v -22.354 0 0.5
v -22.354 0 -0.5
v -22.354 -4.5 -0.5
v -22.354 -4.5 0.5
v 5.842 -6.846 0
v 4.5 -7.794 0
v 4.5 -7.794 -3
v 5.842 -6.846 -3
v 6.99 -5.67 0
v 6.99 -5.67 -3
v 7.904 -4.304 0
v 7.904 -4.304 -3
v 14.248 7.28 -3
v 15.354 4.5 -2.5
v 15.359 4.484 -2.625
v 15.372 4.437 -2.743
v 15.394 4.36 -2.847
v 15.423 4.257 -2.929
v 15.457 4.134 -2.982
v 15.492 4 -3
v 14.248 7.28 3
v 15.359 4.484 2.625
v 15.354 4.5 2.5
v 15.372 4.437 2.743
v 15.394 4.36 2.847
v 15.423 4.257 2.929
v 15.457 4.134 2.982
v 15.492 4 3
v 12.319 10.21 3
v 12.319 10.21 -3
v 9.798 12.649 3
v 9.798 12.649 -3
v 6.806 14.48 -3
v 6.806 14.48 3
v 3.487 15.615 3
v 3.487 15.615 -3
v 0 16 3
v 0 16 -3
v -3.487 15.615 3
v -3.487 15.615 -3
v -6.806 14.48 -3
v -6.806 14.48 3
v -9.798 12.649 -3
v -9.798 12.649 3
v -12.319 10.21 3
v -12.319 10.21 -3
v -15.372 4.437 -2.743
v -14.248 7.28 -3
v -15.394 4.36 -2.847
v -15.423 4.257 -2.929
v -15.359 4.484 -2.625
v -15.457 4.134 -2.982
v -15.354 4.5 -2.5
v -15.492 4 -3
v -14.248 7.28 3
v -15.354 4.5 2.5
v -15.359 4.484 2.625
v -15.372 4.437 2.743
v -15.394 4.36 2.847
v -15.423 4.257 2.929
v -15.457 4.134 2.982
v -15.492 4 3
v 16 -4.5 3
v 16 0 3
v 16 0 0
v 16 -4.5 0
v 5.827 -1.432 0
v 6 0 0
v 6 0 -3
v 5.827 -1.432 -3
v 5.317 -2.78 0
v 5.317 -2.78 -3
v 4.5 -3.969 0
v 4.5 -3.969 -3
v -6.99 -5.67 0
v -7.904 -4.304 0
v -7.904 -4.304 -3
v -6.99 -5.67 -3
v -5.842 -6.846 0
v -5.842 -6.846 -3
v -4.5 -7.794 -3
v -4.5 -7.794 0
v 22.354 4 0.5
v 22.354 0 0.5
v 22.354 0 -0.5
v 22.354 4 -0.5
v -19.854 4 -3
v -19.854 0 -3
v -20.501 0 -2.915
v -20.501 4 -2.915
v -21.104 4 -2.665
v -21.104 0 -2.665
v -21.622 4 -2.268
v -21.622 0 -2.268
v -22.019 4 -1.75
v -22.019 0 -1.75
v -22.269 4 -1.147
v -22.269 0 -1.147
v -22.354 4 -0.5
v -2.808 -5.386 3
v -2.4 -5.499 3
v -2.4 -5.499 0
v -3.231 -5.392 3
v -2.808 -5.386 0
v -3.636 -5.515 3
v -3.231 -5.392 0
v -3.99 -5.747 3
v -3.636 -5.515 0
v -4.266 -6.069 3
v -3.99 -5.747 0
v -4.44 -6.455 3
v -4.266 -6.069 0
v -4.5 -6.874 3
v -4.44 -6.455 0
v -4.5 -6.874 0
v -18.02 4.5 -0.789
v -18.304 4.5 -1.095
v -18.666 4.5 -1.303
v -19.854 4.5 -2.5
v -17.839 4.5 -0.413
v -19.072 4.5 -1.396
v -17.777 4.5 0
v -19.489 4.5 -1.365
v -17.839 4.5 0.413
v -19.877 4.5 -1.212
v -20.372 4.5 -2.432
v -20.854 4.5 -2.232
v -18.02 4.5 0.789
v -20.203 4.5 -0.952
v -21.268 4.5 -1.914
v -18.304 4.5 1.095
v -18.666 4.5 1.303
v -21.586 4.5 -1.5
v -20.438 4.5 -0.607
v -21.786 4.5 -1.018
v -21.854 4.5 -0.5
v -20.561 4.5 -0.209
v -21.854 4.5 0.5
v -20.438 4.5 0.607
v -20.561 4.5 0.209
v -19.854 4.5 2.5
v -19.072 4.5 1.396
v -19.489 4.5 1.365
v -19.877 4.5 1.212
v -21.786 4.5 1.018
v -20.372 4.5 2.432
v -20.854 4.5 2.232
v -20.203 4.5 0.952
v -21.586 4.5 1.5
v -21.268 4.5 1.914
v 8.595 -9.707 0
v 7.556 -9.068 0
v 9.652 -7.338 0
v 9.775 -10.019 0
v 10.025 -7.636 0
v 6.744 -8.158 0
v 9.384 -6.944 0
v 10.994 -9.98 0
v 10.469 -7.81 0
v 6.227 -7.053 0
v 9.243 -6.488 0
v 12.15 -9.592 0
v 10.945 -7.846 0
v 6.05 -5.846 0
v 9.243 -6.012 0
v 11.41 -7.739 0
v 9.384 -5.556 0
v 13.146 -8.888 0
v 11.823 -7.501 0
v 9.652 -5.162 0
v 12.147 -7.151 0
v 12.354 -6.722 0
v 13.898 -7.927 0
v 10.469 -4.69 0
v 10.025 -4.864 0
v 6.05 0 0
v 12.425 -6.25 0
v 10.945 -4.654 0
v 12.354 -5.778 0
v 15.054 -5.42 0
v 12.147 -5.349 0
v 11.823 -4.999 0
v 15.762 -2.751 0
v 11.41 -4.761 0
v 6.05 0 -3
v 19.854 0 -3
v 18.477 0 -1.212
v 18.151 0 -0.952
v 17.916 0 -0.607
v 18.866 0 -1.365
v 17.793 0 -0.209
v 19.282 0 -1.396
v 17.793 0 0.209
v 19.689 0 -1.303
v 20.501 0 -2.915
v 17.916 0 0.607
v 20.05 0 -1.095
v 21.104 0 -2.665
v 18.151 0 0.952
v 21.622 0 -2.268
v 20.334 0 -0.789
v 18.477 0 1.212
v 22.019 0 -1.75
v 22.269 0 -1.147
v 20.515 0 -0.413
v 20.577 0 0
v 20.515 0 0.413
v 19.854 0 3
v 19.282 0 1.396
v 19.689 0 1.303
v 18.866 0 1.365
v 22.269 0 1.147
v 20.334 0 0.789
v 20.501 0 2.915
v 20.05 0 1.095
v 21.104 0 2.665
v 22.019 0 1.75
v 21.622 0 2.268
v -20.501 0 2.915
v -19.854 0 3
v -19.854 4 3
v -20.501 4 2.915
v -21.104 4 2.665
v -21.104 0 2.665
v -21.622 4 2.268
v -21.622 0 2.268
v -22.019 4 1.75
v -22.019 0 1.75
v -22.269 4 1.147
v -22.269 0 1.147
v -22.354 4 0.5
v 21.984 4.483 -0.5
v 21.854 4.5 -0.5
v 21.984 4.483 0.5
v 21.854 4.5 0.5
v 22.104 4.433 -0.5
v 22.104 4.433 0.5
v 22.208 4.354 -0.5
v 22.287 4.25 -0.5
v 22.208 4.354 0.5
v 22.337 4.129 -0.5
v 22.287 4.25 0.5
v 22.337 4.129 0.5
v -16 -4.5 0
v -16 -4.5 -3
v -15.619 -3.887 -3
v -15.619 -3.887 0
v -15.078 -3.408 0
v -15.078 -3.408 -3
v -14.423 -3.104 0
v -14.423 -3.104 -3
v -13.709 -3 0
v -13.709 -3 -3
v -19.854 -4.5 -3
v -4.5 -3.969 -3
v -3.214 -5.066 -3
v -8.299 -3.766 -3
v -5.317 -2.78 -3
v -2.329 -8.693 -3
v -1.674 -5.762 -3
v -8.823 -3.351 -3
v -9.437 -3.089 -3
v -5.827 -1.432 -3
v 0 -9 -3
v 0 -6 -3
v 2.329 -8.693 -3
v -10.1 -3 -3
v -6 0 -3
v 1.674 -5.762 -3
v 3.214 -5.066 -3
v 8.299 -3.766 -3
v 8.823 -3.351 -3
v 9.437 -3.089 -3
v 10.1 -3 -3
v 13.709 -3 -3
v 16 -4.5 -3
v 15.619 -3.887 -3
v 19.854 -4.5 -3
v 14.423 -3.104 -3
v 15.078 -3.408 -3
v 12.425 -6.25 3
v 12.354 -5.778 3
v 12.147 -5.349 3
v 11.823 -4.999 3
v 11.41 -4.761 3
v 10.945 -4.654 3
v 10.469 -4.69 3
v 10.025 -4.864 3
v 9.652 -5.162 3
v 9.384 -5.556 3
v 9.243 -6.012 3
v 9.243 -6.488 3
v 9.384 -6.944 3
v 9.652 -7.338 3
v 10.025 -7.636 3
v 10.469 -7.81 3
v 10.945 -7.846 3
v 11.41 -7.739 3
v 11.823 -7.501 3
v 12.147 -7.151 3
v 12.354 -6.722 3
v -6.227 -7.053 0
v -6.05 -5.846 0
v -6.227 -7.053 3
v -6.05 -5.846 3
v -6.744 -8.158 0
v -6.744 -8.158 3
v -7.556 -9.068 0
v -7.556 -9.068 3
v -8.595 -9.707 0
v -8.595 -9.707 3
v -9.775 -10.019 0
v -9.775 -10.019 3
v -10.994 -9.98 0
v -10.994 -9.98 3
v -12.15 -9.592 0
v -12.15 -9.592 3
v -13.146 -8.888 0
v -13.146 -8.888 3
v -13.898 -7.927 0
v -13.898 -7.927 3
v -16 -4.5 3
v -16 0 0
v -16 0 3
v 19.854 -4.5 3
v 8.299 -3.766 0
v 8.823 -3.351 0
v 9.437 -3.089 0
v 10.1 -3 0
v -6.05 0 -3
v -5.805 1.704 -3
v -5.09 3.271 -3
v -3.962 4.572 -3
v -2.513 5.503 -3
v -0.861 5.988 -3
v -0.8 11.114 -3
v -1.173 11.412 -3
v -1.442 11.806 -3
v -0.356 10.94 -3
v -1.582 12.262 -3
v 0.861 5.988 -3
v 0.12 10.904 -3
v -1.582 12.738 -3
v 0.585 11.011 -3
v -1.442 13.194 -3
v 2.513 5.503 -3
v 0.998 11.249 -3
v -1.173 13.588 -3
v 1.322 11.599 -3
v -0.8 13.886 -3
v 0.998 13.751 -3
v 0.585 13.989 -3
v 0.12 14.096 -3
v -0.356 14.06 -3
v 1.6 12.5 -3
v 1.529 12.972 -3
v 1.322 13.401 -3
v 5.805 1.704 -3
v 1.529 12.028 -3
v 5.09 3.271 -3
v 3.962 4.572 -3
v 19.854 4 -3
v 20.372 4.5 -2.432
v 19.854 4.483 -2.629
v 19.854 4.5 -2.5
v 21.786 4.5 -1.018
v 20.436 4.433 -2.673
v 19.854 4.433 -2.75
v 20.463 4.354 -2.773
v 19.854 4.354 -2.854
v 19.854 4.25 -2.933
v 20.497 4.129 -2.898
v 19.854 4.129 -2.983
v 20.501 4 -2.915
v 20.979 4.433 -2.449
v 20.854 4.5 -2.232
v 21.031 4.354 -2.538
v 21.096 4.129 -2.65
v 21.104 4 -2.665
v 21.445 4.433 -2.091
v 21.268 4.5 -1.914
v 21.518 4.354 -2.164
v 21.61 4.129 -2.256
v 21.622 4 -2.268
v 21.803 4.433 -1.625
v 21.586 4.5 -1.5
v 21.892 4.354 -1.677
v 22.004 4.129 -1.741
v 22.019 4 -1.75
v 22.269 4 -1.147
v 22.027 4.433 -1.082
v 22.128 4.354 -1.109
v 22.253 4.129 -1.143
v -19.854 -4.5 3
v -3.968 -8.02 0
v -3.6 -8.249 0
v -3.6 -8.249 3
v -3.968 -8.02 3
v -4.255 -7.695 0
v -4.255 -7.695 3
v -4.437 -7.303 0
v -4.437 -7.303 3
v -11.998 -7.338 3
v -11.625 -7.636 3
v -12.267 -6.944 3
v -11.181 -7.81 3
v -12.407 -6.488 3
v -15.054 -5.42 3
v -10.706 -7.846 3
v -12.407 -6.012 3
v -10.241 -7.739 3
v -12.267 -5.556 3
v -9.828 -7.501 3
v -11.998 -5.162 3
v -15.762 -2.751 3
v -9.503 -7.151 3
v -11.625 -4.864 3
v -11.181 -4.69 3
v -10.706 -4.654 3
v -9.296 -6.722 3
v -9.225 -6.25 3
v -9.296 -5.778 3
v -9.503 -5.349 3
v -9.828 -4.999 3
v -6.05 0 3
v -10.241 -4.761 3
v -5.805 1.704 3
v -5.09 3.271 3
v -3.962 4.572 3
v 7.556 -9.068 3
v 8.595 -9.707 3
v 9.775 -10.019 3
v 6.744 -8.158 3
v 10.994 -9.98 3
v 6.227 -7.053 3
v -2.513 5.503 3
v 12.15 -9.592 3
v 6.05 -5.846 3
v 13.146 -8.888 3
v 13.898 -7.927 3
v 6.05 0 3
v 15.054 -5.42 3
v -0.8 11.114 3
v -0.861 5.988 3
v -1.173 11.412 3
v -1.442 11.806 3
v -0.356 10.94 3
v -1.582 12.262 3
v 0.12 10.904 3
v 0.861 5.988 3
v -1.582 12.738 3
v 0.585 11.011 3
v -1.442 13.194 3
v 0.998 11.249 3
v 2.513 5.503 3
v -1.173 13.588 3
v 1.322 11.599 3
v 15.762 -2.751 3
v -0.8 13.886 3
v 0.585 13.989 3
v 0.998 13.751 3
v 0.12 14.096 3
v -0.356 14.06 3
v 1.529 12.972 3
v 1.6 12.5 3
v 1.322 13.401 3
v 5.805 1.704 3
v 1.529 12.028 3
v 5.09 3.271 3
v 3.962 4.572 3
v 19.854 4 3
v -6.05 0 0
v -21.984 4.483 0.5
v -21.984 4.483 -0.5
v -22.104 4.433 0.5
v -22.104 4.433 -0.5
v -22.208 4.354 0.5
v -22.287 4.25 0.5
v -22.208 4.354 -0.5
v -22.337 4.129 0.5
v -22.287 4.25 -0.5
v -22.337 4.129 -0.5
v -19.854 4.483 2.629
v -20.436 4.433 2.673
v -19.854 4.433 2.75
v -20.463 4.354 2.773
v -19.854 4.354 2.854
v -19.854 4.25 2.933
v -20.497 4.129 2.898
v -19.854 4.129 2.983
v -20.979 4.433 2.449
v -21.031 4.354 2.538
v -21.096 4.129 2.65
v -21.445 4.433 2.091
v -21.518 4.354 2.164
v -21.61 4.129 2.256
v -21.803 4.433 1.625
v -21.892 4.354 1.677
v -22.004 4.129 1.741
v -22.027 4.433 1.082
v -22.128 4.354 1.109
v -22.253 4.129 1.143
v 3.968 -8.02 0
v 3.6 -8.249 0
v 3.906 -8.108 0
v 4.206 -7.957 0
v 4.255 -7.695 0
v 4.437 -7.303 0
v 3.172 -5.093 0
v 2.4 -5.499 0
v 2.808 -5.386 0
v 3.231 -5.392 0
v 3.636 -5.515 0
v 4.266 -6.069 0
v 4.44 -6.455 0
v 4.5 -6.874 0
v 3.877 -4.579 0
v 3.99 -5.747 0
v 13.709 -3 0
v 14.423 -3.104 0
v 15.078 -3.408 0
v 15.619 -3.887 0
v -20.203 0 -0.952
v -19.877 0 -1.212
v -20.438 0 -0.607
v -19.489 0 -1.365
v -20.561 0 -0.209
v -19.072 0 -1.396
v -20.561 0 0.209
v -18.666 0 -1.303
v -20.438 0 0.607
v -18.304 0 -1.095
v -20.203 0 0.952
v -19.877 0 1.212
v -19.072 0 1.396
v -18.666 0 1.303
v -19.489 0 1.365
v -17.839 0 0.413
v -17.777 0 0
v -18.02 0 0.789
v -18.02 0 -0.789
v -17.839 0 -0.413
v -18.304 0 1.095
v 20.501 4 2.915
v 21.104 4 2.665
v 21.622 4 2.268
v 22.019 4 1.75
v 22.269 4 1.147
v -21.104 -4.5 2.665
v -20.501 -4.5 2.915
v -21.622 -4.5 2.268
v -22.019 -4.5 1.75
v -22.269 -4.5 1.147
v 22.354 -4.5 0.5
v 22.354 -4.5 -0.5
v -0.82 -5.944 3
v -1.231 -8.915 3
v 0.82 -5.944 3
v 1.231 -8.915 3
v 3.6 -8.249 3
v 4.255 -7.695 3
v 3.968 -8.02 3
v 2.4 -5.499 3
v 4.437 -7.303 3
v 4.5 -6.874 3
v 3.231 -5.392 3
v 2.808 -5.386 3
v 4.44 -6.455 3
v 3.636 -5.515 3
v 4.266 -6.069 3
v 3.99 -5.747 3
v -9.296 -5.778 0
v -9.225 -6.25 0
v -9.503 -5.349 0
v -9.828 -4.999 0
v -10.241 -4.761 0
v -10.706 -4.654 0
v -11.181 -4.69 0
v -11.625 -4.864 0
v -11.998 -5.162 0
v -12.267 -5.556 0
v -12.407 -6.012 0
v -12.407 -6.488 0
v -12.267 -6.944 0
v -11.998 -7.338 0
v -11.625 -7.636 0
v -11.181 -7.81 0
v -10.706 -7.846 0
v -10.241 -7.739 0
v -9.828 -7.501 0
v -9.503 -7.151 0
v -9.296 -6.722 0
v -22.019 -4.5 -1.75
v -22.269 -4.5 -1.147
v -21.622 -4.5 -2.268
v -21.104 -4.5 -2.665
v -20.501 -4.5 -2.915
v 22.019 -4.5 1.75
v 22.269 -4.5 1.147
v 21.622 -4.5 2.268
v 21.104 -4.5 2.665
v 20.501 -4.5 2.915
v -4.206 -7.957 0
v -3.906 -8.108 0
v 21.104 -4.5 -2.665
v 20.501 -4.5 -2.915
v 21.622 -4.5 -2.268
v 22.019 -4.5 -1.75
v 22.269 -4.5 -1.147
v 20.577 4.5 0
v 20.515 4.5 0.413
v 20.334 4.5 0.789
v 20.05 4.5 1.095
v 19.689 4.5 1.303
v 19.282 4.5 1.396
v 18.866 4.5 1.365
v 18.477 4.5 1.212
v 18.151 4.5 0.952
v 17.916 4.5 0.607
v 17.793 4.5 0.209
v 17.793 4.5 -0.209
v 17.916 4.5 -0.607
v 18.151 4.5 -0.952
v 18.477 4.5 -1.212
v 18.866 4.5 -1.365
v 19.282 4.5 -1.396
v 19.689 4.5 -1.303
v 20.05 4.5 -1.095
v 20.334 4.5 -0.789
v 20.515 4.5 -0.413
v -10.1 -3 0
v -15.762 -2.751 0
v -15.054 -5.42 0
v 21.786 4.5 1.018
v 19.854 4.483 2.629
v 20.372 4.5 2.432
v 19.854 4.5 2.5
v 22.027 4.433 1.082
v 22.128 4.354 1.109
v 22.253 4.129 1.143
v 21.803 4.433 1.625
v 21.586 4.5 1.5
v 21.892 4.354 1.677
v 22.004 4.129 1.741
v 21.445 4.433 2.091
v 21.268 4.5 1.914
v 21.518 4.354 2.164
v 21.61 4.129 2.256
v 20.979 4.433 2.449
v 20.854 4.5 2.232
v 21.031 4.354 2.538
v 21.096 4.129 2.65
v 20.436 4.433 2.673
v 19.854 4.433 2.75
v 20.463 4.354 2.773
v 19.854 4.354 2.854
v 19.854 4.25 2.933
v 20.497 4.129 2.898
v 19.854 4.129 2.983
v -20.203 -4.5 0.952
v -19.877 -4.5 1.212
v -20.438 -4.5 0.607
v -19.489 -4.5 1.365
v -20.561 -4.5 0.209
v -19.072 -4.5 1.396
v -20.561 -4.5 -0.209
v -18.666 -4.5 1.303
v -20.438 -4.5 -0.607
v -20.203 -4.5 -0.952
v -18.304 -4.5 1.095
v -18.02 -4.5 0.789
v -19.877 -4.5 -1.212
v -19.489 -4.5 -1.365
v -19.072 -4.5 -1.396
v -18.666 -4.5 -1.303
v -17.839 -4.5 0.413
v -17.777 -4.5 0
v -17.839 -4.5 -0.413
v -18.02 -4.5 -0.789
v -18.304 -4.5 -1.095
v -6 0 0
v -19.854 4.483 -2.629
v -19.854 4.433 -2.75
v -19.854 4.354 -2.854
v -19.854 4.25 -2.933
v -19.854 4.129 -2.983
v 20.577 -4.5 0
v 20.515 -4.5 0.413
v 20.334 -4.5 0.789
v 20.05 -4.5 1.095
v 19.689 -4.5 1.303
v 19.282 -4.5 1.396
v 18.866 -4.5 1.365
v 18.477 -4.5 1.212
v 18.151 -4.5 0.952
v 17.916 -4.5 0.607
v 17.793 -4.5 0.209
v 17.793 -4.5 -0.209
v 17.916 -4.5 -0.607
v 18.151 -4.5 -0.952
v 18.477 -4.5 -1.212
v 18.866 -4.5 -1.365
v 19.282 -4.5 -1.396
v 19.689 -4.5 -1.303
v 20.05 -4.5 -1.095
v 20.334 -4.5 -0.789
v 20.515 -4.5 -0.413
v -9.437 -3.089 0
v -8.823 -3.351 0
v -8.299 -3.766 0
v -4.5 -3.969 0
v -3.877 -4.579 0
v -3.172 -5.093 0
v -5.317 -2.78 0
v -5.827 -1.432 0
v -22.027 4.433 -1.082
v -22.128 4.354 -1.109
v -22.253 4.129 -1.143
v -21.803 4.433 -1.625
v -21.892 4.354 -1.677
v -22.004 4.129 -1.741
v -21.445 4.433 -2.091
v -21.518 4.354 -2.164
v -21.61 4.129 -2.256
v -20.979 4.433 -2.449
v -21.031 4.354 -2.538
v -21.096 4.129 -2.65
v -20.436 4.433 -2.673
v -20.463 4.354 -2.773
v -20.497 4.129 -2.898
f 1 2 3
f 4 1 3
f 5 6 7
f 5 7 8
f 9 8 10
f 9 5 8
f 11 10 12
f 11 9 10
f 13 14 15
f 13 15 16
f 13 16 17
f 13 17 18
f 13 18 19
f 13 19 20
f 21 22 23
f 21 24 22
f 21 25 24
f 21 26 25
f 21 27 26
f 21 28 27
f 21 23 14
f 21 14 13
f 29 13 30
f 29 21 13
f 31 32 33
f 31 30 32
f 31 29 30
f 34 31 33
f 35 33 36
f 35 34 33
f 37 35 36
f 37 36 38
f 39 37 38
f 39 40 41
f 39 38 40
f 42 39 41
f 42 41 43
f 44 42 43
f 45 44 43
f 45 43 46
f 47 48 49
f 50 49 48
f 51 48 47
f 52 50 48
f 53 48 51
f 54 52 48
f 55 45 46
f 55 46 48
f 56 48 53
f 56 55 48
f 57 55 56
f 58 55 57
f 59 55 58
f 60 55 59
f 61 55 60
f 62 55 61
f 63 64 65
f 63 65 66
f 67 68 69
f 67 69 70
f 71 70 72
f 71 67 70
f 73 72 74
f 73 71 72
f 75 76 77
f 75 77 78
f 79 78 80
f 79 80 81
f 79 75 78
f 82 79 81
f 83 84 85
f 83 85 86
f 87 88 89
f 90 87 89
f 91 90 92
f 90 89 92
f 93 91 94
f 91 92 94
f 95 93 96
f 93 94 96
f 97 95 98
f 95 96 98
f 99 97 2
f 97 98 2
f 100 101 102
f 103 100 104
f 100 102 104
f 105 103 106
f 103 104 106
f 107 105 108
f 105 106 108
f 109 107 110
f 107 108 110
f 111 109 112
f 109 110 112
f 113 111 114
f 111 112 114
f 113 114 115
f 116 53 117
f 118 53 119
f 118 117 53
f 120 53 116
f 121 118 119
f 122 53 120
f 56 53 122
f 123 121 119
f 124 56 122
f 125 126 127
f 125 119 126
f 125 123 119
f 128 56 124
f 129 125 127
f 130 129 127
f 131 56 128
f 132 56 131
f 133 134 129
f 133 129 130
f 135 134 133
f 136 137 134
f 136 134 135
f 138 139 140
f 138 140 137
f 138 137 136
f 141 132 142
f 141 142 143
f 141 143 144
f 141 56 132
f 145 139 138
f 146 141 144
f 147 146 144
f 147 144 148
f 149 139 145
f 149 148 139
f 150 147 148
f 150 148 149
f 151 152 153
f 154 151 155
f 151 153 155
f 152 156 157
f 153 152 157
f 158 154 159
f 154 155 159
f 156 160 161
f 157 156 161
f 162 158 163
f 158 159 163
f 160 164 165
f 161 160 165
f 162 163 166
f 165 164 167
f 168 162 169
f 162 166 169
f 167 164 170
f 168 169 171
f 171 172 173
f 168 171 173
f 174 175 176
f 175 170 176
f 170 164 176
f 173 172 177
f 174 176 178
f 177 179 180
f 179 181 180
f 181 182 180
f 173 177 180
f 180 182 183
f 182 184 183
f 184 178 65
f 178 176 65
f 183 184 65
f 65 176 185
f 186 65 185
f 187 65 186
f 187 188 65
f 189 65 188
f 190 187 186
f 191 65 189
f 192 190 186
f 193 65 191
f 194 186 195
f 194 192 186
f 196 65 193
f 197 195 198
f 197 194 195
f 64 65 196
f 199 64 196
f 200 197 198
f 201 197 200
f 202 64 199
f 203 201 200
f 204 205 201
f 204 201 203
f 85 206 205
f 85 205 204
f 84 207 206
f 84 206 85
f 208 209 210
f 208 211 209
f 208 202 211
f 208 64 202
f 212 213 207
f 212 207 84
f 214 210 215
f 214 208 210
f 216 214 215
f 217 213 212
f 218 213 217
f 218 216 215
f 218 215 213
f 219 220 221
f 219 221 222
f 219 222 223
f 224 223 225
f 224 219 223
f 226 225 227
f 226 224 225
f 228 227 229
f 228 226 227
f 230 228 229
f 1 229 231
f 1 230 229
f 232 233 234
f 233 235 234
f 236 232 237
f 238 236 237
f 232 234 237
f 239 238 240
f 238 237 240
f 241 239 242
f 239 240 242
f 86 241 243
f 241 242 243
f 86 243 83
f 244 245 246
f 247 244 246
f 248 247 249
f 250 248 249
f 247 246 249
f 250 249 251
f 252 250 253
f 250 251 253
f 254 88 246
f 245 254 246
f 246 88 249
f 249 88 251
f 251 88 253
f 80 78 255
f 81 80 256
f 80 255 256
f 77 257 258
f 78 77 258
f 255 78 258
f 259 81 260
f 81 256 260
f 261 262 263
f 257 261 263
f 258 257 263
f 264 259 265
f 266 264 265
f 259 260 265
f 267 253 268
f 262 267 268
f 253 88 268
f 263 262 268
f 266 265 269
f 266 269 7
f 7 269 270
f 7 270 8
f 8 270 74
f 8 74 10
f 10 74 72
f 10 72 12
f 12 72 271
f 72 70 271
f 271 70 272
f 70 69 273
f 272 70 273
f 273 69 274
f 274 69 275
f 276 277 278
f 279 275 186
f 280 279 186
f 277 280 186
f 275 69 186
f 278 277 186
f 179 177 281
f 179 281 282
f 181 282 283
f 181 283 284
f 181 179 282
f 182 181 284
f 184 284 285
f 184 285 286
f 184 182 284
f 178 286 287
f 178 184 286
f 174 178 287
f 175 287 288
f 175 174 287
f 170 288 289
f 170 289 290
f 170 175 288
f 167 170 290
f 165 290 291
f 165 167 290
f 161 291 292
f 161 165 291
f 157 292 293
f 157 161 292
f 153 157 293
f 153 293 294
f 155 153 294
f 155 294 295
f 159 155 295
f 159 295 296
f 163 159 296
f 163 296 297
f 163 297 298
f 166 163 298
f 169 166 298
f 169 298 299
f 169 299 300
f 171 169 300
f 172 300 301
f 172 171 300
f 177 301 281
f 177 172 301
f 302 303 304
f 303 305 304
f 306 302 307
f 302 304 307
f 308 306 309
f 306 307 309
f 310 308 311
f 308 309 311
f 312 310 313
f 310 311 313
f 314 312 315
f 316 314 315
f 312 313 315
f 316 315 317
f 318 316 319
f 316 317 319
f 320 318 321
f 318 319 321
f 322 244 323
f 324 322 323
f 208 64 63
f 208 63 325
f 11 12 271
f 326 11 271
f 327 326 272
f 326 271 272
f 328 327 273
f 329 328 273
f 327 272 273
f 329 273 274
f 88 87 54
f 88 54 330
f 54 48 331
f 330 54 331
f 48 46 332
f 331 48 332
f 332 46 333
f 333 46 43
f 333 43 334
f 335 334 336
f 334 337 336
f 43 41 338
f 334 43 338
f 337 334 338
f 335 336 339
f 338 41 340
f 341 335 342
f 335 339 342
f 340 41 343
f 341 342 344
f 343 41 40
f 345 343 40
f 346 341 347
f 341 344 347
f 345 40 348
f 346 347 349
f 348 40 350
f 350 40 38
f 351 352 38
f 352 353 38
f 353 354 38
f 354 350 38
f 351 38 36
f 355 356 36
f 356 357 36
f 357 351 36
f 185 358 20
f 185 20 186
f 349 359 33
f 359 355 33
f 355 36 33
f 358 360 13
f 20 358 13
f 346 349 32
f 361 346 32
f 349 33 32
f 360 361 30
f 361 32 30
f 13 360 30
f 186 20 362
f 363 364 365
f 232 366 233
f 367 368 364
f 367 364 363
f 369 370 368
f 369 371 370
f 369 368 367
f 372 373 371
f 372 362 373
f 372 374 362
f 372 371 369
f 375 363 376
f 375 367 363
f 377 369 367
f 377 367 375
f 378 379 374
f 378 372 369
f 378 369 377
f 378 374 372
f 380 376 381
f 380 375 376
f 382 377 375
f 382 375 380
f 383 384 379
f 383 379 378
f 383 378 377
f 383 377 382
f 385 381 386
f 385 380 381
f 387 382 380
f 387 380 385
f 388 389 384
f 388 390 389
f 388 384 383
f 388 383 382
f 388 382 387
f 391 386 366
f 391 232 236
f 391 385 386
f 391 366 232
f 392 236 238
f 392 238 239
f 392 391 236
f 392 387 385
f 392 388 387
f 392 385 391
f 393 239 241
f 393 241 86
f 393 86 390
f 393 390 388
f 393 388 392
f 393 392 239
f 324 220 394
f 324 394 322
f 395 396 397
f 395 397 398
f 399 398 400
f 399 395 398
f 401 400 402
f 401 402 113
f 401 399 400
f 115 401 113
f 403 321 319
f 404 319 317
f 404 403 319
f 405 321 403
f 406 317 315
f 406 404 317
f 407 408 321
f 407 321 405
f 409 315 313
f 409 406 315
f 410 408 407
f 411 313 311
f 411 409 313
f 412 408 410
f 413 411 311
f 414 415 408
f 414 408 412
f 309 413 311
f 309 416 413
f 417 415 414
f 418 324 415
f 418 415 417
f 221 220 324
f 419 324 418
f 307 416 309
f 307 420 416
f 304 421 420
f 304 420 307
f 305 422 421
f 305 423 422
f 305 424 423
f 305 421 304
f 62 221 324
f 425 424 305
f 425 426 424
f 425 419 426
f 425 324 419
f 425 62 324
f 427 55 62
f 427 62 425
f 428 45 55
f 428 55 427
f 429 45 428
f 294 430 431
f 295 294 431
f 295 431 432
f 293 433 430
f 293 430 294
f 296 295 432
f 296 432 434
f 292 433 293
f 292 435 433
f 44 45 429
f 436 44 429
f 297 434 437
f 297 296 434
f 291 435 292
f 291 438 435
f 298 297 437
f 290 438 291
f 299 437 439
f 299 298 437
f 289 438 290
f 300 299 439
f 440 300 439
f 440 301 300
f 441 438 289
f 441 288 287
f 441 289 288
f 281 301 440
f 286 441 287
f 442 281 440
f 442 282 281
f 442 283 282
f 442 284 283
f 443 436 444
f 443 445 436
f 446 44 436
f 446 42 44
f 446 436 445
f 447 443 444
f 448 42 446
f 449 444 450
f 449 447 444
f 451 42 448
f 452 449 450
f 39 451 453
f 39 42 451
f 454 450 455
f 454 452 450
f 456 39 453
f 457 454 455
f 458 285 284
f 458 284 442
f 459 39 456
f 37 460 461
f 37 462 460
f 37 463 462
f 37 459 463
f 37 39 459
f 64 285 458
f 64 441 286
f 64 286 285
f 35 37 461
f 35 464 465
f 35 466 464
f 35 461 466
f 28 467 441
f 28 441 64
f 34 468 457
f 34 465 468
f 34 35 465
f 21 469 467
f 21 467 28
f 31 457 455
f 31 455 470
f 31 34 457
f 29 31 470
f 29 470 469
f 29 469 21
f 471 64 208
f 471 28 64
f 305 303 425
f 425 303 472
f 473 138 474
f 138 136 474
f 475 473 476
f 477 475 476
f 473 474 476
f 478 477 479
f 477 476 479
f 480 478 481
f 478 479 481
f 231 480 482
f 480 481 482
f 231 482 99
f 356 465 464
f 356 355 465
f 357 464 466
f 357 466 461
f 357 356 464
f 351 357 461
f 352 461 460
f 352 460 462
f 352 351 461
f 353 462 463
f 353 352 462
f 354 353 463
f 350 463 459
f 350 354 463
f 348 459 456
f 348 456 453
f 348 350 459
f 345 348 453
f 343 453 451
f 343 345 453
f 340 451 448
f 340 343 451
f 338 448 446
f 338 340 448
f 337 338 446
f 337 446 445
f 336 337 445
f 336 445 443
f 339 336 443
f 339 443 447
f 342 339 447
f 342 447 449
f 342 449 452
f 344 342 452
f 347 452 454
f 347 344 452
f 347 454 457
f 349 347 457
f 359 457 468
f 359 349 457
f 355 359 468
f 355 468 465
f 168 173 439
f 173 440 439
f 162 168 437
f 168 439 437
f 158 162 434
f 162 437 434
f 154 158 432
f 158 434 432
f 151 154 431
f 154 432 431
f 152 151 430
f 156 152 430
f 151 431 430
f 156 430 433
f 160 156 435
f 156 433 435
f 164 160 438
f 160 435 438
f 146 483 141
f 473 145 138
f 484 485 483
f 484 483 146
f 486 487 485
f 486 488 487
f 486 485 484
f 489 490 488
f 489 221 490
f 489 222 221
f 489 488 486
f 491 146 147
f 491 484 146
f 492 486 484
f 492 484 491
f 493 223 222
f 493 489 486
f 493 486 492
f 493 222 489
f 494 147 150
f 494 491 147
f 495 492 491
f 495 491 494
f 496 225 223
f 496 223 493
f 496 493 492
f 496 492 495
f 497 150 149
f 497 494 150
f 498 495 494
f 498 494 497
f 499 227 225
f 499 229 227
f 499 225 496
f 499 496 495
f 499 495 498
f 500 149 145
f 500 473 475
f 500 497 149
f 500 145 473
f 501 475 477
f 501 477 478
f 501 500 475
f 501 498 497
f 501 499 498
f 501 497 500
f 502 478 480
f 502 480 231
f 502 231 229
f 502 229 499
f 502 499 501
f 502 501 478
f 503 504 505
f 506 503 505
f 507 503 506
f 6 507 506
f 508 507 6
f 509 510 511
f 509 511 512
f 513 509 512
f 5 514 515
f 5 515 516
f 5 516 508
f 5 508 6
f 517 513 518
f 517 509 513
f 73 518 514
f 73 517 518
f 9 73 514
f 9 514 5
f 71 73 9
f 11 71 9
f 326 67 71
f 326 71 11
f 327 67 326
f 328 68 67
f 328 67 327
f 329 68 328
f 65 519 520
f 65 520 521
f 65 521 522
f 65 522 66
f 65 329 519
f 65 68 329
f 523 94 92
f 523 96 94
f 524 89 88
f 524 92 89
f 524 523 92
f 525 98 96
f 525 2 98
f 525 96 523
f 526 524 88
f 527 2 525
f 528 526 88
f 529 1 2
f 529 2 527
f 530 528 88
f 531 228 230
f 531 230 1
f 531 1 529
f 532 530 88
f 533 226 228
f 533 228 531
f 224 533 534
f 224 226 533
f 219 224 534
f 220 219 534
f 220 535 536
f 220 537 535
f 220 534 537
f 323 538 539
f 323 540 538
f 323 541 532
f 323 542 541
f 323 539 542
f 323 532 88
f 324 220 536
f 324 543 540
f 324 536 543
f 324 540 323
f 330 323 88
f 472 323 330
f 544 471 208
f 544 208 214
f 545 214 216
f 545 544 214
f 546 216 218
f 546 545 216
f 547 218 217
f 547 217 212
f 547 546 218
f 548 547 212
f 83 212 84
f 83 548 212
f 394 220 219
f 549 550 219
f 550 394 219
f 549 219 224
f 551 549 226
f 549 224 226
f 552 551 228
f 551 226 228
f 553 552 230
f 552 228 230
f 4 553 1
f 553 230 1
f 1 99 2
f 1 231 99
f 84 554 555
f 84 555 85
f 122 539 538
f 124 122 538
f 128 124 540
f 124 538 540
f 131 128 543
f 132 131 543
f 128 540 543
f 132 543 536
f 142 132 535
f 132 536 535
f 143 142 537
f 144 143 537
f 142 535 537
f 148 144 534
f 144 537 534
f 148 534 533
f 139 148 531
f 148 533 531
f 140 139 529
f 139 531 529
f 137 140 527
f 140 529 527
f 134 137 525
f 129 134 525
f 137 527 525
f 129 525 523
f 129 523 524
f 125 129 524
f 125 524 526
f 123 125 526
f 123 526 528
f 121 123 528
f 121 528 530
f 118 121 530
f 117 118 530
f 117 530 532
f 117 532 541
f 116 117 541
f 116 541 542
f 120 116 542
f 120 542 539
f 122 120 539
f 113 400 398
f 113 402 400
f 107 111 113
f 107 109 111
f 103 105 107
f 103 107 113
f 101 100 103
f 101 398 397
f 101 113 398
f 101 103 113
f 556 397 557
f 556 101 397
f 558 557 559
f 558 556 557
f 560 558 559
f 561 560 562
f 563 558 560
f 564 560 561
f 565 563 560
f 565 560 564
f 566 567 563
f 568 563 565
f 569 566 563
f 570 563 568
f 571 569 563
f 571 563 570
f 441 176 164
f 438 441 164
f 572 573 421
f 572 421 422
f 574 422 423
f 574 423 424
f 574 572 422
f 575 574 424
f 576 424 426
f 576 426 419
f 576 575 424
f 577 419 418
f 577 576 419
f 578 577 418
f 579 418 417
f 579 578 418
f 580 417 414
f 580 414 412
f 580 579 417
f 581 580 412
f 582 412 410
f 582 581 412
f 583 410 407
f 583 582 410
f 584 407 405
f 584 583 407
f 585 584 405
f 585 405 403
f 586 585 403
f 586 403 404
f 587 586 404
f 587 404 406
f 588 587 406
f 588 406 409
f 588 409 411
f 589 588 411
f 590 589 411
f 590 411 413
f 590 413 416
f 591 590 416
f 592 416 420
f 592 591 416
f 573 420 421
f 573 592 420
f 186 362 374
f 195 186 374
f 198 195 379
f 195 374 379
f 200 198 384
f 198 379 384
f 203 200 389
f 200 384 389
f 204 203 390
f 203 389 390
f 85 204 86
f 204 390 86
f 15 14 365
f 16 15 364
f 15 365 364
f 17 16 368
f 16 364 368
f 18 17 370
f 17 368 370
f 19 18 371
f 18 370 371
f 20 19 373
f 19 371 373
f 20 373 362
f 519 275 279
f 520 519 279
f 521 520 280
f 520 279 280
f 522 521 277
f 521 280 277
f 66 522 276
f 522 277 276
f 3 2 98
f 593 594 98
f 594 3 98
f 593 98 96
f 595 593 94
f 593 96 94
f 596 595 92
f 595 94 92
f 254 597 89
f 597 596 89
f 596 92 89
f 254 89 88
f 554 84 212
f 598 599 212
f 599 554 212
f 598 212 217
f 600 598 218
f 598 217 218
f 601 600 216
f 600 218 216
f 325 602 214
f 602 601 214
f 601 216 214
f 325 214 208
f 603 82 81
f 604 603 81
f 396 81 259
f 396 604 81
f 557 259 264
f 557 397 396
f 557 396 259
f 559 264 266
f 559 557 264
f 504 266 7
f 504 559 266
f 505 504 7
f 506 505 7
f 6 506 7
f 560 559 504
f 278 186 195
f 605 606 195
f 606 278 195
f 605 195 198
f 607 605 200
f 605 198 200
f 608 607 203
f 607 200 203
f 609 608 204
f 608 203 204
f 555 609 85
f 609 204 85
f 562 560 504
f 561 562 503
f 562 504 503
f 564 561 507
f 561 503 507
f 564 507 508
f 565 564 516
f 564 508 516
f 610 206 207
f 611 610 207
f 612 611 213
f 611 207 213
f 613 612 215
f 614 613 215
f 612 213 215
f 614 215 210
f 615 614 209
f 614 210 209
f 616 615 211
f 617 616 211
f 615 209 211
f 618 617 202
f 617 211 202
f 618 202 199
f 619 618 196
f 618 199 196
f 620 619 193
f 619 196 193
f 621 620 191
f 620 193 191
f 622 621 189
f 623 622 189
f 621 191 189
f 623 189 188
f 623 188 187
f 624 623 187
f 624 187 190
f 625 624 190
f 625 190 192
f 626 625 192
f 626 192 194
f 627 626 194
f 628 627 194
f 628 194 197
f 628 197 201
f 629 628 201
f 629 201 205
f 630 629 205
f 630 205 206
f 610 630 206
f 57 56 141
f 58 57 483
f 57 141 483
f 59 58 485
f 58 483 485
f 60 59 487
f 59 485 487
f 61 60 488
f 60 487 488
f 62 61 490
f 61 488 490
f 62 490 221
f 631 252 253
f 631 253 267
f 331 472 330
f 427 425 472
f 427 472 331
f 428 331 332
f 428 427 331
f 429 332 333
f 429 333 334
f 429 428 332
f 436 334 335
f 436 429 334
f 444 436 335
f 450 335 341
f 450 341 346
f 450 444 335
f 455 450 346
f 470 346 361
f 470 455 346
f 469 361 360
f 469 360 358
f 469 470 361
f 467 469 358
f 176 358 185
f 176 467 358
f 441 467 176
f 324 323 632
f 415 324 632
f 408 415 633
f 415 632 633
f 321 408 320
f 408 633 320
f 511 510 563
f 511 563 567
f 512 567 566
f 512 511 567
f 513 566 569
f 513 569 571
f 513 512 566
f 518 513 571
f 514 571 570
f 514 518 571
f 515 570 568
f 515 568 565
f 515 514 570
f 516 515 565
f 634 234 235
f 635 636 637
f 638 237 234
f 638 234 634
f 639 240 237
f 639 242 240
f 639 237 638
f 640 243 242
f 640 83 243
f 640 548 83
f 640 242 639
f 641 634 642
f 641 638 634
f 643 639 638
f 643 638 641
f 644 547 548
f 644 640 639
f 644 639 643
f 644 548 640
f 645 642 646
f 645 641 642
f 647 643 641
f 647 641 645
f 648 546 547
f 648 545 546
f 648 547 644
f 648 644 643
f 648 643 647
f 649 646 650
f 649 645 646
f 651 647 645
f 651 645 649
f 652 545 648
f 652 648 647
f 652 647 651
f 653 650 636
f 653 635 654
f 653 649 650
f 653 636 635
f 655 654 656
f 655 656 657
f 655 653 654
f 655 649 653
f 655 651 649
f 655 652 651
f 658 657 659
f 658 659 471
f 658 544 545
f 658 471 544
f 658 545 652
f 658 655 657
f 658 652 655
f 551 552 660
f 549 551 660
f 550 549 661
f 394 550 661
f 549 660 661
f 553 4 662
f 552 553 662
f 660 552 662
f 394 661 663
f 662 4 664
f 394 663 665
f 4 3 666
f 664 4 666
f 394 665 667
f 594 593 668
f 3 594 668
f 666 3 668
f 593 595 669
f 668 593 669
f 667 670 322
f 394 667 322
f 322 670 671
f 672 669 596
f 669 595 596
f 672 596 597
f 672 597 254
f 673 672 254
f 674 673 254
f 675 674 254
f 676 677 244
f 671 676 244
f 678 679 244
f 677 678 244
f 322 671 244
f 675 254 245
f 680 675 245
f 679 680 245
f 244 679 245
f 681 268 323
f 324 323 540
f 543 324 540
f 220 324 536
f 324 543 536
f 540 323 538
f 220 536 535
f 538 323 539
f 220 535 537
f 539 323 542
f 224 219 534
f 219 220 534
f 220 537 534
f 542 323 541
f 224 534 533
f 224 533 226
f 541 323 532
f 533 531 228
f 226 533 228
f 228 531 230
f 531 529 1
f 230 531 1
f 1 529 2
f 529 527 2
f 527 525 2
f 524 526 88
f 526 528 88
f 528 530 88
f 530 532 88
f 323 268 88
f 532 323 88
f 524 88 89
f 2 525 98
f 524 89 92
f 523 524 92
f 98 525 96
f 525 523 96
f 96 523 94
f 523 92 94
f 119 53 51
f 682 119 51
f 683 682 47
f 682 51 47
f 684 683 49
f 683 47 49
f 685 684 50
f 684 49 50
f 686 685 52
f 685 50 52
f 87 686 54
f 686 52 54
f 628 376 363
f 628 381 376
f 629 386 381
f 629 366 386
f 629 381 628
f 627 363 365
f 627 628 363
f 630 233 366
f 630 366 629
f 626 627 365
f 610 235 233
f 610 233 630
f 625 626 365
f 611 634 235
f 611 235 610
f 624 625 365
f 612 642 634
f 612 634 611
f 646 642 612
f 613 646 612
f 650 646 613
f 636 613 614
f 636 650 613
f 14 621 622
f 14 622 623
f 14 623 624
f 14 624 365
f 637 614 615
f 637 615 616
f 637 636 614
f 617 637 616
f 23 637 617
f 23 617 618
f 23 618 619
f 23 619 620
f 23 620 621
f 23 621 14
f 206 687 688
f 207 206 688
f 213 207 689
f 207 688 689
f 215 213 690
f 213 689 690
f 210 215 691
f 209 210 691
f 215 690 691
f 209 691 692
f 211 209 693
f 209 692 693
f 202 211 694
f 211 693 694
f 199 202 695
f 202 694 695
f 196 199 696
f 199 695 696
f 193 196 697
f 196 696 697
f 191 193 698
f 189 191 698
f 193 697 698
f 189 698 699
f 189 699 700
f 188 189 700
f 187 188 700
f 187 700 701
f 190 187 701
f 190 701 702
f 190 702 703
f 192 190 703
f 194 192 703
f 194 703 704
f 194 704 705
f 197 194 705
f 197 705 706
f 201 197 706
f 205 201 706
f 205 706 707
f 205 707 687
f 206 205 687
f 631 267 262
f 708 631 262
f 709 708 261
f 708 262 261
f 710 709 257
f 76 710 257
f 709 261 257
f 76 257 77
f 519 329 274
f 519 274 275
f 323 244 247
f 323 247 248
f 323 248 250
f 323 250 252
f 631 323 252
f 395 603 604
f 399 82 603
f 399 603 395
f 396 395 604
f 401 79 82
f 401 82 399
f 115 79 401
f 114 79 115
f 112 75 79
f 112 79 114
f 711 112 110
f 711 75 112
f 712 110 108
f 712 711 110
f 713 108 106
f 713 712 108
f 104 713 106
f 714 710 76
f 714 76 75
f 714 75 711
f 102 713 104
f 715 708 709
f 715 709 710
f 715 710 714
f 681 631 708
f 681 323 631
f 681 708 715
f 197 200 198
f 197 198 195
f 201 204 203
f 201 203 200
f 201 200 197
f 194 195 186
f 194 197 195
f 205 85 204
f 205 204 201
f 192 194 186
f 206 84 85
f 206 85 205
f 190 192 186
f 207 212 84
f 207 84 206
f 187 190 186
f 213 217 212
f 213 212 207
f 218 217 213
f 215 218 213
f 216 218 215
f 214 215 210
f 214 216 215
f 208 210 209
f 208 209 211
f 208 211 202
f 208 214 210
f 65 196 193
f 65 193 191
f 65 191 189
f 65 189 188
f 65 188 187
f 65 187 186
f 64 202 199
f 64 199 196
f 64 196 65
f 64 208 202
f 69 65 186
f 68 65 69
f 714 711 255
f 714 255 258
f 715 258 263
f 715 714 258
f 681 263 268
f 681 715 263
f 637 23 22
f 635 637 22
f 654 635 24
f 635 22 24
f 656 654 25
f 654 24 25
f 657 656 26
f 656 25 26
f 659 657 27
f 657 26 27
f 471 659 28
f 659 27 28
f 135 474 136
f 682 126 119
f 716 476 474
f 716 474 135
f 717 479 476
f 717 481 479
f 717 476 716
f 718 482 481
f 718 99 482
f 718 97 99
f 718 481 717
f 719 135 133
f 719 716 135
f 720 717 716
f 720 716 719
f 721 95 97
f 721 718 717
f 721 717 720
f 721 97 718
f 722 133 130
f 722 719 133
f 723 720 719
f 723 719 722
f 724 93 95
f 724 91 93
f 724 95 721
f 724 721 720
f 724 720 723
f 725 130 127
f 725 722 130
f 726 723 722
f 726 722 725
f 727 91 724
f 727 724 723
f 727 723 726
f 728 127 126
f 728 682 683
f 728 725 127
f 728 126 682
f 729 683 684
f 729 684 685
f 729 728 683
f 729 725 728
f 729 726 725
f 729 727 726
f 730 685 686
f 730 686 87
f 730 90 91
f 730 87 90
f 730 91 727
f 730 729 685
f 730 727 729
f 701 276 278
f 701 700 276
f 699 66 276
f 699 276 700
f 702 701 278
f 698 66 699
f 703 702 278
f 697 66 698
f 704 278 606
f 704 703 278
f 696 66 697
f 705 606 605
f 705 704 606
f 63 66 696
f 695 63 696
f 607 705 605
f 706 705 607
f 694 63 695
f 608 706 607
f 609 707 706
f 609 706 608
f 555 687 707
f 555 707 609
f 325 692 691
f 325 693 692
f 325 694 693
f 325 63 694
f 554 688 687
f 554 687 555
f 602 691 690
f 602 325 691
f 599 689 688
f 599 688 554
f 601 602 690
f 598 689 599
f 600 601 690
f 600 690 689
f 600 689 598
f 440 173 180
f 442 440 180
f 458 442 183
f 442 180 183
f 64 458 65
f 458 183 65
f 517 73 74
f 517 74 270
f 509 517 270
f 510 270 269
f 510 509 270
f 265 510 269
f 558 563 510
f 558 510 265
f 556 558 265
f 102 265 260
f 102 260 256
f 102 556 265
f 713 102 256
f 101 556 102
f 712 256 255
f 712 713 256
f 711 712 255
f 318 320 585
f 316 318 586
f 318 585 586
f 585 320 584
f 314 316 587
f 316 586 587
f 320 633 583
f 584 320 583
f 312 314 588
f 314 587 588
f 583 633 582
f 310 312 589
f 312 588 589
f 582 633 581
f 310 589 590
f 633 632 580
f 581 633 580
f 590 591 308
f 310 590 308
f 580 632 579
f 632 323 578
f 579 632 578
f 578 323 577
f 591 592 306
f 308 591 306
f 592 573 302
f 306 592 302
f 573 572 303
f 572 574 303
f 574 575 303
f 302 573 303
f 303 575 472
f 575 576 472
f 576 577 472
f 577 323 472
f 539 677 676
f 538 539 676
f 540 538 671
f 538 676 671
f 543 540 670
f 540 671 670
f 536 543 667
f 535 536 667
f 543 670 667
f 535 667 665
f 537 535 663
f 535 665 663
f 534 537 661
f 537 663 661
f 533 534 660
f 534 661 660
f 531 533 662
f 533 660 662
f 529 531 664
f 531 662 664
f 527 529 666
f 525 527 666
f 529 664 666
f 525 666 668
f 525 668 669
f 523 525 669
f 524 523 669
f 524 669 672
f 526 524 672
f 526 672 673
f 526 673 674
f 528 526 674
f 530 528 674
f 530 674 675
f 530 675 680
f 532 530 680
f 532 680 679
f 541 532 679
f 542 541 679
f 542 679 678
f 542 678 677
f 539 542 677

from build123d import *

# Parameters (mm, degrees)
F0_R          = 1.6
F1_DEPTH      = 3
F2_DEPTH      = 3
F3_R          = 1.4
F4_DEPTH      = 16.001
F5_R          = 2.5
F6_R          = 0.5
F7_R          = 4.2
F9_DEPTH      = 3
F10_DEPTH     = 3
F11_R         = 1.4
F12_DEPTH     = 25
F13_T1_DEPTH  = 3
F13_T3_DEPTH  = 3
F13_T5_DEPTH  = 3
F13_T7_DEPTH  = 3
F13_T9_DEPTH  = 17
F13_T11_DEPTH = 17
F13_T13_DEPTH = 17
F13_T15_DEPTH = 17
F14_T1_DEPTH  = 10.2630914396
F14_T3_DEPTH  = 5.5205236091


# Not quite as in the source:
# - a fillet or chamfer that OpenCascade refuses, or shapes differently, is made with other operations: its cross-section is extruded or revolved along the edge and cut away or added


with BuildPart() as f1:
    # F0 (on Top) → F1 (new body)
    with BuildSketch(Plane.XY):
        with BuildLine():
            ThreePointArc((-16, 0), (-15.8377151213, 2.273055155), (-15.3541525328, 4.5))
            Line((-15.3541525328, 4.5), (-22.3541525328, 4.5))
            Line((-22.3541525328, 4.5), (-22.3541525328, 0))
            Line((-22.3541525328, 0), (-16, 0))
        make_face()
        with BuildLine():
            Line((7.65, 0), (16, 0))
            ThreePointArc((16, 0), (15.8377151213, 2.273055155), (15.3541525328, 4.5))
            ThreePointArc((15.3541525328, 4.5), (0, 16), (-15.3541525328, 4.5))
            ThreePointArc((-15.3541525328, 4.5), (-15.8377151213, 2.273055155), (-16, 0))
            Line((-16, 0), (-7.65, 0))
            ThreePointArc((-7.65, 0), (0, 7.65), (7.65, 0))
        make_face()
        with Locations((0, 12.5)):
            Circle(F0_R, mode=Mode.SUBTRACT)
        with BuildLine():
            ThreePointArc((-6.05, 0), (0, 6.05), (6.05, 0))
            Line((6.05, 0), (7.65, 0))
            ThreePointArc((7.65, 0), (0, 7.65), (-7.65, 0))
            Line((-7.65, 0), (-6.05, 0))
        make_face()
        with BuildLine():
            ThreePointArc((15.3541525328, 4.5), (15.8377151213, 2.273055155), (16, 0))
            Line((16, 0), (22.3541525328, 0))
            Line((22.3541525328, 0), (22.3541525328, 4.5))
            Line((22.3541525328, 4.5), (15.3541525328, 4.5))
        make_face()
        with BuildLine():
            Line((-6.05, -14.8120727786), (-6.05, 0))
            Line((-6.05, 0), (-7.65, 0))
            Line((-7.65, 0), (-16, 0))
            ThreePointArc((-16, 0), (-13.2815661727, -8.9218832093), (-6.05, -14.8120727786))
        make_face()
        with Locations((-10.8253175473, -6.25)):
            Circle(F0_R, mode=Mode.SUBTRACT)
        with BuildLine():
            Line((6.05, 0), (6.05, -14.8120727786))
            ThreePointArc((6.05, -14.8120727786), (13.2815661727, -8.9218832093), (16, 0))
            Line((16, 0), (7.65, 0))
            Line((7.65, 0), (6.05, 0))
        make_face()
        with Locations((10.8253175473, -6.25)):
            Circle(F0_R, mode=Mode.SUBTRACT)
    extrude(amount=F1_DEPTH)

    # F0 (on Top) → F2 (join)
    with BuildSketch(Plane.XY):
        with BuildLine():
            Line((7.65, 0), (16, 0))
            ThreePointArc((16, 0), (15.8377151213, 2.273055155), (15.3541525328, 4.5))
            ThreePointArc((15.3541525328, 4.5), (0, 16), (-15.3541525328, 4.5))
            ThreePointArc((-15.3541525328, 4.5), (-15.8377151213, 2.273055155), (-16, 0))
            Line((-16, 0), (-7.65, 0))
            ThreePointArc((-7.65, 0), (0, 7.65), (7.65, 0))
        make_face()
        with Locations((0, 12.5)):
            Circle(F0_R, mode=Mode.SUBTRACT)
        with BuildLine():
            ThreePointArc((-6.05, 0), (0, 6.05), (6.05, 0))
            Line((6.05, 0), (7.65, 0))
            ThreePointArc((7.65, 0), (0, 7.65), (-7.65, 0))
            Line((-7.65, 0), (-6.05, 0))
        make_face()
        with BuildLine():
            ThreePointArc((15.3541525328, 4.5), (15.8377151213, 2.273055155), (16, 0))
            Line((16, 0), (22.3541525328, 0))
            Line((22.3541525328, 0), (22.3541525328, 4.5))
            Line((22.3541525328, 4.5), (15.3541525328, 4.5))
        make_face()
        with BuildLine():
            ThreePointArc((-16, 0), (-15.8377151213, 2.273055155), (-15.3541525328, 4.5))
            Line((-15.3541525328, 4.5), (-22.3541525328, 4.5))
            Line((-22.3541525328, 4.5), (-22.3541525328, 0))
            Line((-22.3541525328, 0), (-16, 0))
        make_face()
    extrude(amount=-F2_DEPTH)

    # F3 (on face) → F4 (cut, through all)
    with BuildSketch(Plane.XZ):
        with Locations((19.1770762664, 0)):
            Circle(F3_R)
        with Locations((-19.1770762664, 0)):
            Circle(F3_R)
    extrude(amount=-F4_DEPTH, mode=Mode.SUBTRACT)

    # F5
    f5_edges = [f1.edges().sort_by_distance(p)[0] for p in [
        (-22.354153, 2.25, 3),
        (22.354153, 2.25, 3),
        (-22.354153, 2.25, -3),
        (22.354153, 2.25, -3),
    ]]
    fillet(f5_edges, radius=F5_R)

    # F6
    f6_edges = [f1.edges().sort_by_distance(p)[0] for p in [
        (-17.604153, 4.5, 3),
        (17.604153, 4.5, 3),
        (-21.621919, 4.5, 2.267767),
        (-22.354153, 4.5, 0),
        (-17.604153, 4.5, -3),
        (-21.621919, 4.5, -2.267767),
        (17.604153, 4.5, -3),
        (22.354153, 4.5, 0),
        (21.621919, 4.5, 2.267767),
        (21.621919, 4.5, -2.267767),
    ]]
    fillet(f6_edges, radius=F6_R)

    # F7
    f7_edges = [f1.edges().sort_by_distance(p)[0] for p in [
        (-6.05, -14.812073, 1.5),
        (6.05, -14.812073, 1.5),
    ]]
    fillet(f7_edges, radius=F7_R)


with BuildPart() as f9:
    # F8 (on Top) → F9 (new body)
    with BuildSketch(Plane.XY):
        with BuildLine():
            ThreePointArc((-4.5, -3.9686269666), (-5.6124860802, -2.1213203436), (-6, 0))
            Line((-6, 0), (-9, 0))
            ThreePointArc((-9, 0), (-8.8703870369, -1.5219178085), (-8.4852813742, -3))
            ThreePointArc((-8.4852813742, -3), (-6.9210216111, -5.7532130031), (-4.5, -7.7942286341))
            Line((-4.5, -7.7942286341), (-4.5, -3.9686269666))
        make_face()
        with BuildLine():
            ThreePointArc((4.5, -3.9686269666), (0, -6), (-4.5, -3.9686269666))
            Line((-4.5, -3.9686269666), (-4.5, -7.7942286341))
            ThreePointArc((-4.5, -7.7942286341), (0, -9), (4.5, -7.7942286341))
            Line((4.5, -7.7942286341), (4.5, -3.9686269666))
        make_face()
        with BuildLine():
            ThreePointArc((-8.4852813742, -3), (-8.8703870369, -1.5219178085), (-9, 0))
            Line((-9, 0), (-16, 0))
            Line((-16, 0), (-16, -3))
            Line((-16, -3), (-8.4852813742, -3))
        make_face()
        with BuildLine():
            ThreePointArc((6, 0), (5.6124860802, -2.1213203436), (4.5, -3.9686269666))
            Line((4.5, -3.9686269666), (4.5, -7.7942286341))
            ThreePointArc((4.5, -7.7942286341), (6.9210216111, -5.7532130031), (8.4852813742, -3))
            ThreePointArc((8.4852813742, -3), (8.8703870369, -1.5219178085), (9, 0))
            Line((9, 0), (6, 0))
        make_face()
        Polygon((-16, -3), (-16, 0), (-22.3541525328, 0), (-22.3541525328, -4.5), (-16, -4.5), align=None)
        with BuildLine():
            Line((16, 0), (9, 0))
            ThreePointArc((9, 0), (8.8703870369, -1.5219178085), (8.4852813742, -3))
            Line((8.4852813742, -3), (16, -3))
            Line((16, -3), (16, 0))
        make_face()
        Polygon((22.3541525328, 0), (16, 0), (16, -3), (16, -4.5), (22.3541525328, -4.5), align=None)
    extrude(amount=-F9_DEPTH)

    # F8 (on Top) → F10 (join)
    with BuildSketch(Plane.XY):
        Polygon((-16, -3), (-16, 0), (-22.3541525328, 0), (-22.3541525328, -4.5), (-16, -4.5), align=None)
        Polygon((22.3541525328, 0), (16, 0), (16, -3), (16, -4.5), (22.3541525328, -4.5), align=None)
        with BuildLine():
            ThreePointArc((4.5, -3.9686269666), (0, -6), (-4.5, -3.9686269666))
            Line((-4.5, -3.9686269666), (-4.5, -7.7942286341))
            ThreePointArc((-4.5, -7.7942286341), (0, -9), (4.5, -7.7942286341))
            Line((4.5, -7.7942286341), (4.5, -3.9686269666))
        make_face()
    extrude(amount=F10_DEPTH)

    # F11 (on face) → F12 (cut)
    with BuildSketch(Plane.XZ.offset(4.5)):
        with Locations((-19.1770762664, 0)):
            Circle(F11_R)
        with Locations((19.1770762664, 0)):
            Circle(F11_R)
    extrude(amount=-F12_DEPTH, mode=Mode.SUBTRACT)

    # F13: fillet of radius 2.5 on 8 edges, made by hand

    # F13_s2 → F13_t1 (join)
    with BuildSketch(Plane.XY.offset(-3)):
        with BuildLine():
            ThreePointArc((-16, -4.5), (-15.0780185463, -3.4083499337), (-13.7087121525, -3))
            Line((-13.7087121525, -3), (-16, -3))
            Line((-16, -3), (-16, -4.5))
        make_face()
    extrude(amount=F13_T1_DEPTH)

    # F13_s4 → F13_t3 (join)
    with BuildSketch(Plane.XY.offset(-3)):
        with BuildLine():
            ThreePointArc((-10.0995049384, -3), (-8.8226201422, -3.3506826159), (-7.9039603865, -4.3043478261))
            ThreePointArc((-7.9039603865, -4.3043478261), (-8.220531746, -3.6637218527), (-8.4852813742, -3))
            Line((-8.4852813742, -3), (-10.0995049384, -3))
        make_face()
    extrude(amount=F13_T3_DEPTH)

    # F13_s6 → F13_t5 (join)
    with BuildSketch(Plane.XY.offset(-3)):
        with BuildLine():
            ThreePointArc((7.9039603865, -4.3043478261), (8.8226201422, -3.3506826159), (10.0995049384, -3))
            Line((10.0995049384, -3), (8.4852813742, -3))
            ThreePointArc((8.4852813742, -3), (8.220531746, -3.6637218527), (7.9039603865, -4.3043478261))
        make_face()
    extrude(amount=F13_T5_DEPTH)

    # F13_s8 → F13_t7 (join)
    with BuildSketch(Plane.XY.offset(-3)):
        with BuildLine():
            ThreePointArc((13.7087121525, -3), (15.0780185463, -3.4083499337), (16, -4.5))
            Line((16, -4.5), (16, -3))
            Line((16, -3), (13.7087121525, -3))
        make_face()
    extrude(amount=F13_T7_DEPTH)

    # F13_s10 → F13_t9 (cut)
    with BuildSketch(Plane.XZ.offset(-6.25)):
        with BuildLine():
            ThreePointArc((-22.3541525328, -0.5), (-21.6219194858, -2.267766953), (-19.8541525328, -3))
            Line((-19.8541525328, -3), (-22.3541525328, -3))
            Line((-22.3541525328, -3), (-22.3541525328, -0.5))
        make_face()
    extrude(amount=F13_T9_DEPTH, mode=Mode.SUBTRACT)

    # F13_s12 → F13_t11 (cut)
    with BuildSketch(Plane.XZ.offset(-6.25)):
        with BuildLine():
            ThreePointArc((19.8541525328, -3), (21.6219194858, -2.267766953), (22.3541525328, -0.5))
            Line((22.3541525328, -0.5), (22.3541525328, -3))
            Line((22.3541525328, -3), (19.8541525328, -3))
        make_face()
    extrude(amount=F13_T11_DEPTH, mode=Mode.SUBTRACT)

    # F13_s14 → F13_t13 (cut)
    with BuildSketch(Plane.XZ.offset(-6.25)):
        with BuildLine():
            ThreePointArc((-19.8541525328, 3), (-21.6219194858, 2.267766953), (-22.3541525328, 0.5))
            Line((-22.3541525328, 0.5), (-22.3541525328, 3))
            Line((-22.3541525328, 3), (-19.8541525328, 3))
        make_face()
    extrude(amount=F13_T13_DEPTH, mode=Mode.SUBTRACT)

    # F13_s16 → F13_t15 (cut)
    with BuildSketch(Plane.XZ.offset(-6.25)):
        with BuildLine():
            ThreePointArc((22.3541525328, 0.5), (21.6219194858, 2.267766953), (19.8541525328, 3))
            Line((19.8541525328, 3), (22.3541525328, 3))
            Line((22.3541525328, 3), (22.3541525328, 0.5))
        make_face()
    extrude(amount=F13_T15_DEPTH, mode=Mode.SUBTRACT)

    # F14: fillet of radius 1.5 on 4 edges, made by hand

    # F14_s2 → F14_t1 (cut)
    with BuildSketch(Plane.XY):
        with BuildLine():
            ThreePointArc((-2.4, -5.4990908339), (-3.8215838363, -5.6188735026), (-4.5, -6.8738635424))
            Line((-4.5, -6.8738635424), (-4.5, -3.9686269666))
            ThreePointArc((-4.5, -3.9686269666), (-3.5338477489, -4.8489091647), (-2.4, -5.4990908339))
        make_face()
        with BuildLine():
            ThreePointArc((2.4, -5.4990908339), (3.8215838363, -5.6188735026), (4.5, -6.8738635424))
            Line((4.5, -6.8738635424), (4.5, -3.9686269666))
            ThreePointArc((4.5, -3.9686269666), (3.5338477489, -4.8489091647), (2.4, -5.4990908339))
        make_face()
    extrude(amount=F14_T1_DEPTH, mode=Mode.SUBTRACT)

    # F14_s4 → F14_t3 (cut)
    with BuildSketch(Plane.XY):
        with BuildLine():
            ThreePointArc((-3.6, -8.2486362509), (-4.2549900398, -7.6954473787), (-4.5, -6.8738635424))
            Line((-4.5, -6.8738635424), (-4.5, -7.7942286341))
            ThreePointArc((-4.5, -7.7942286341), (-4.056368027, -8.0340449606), (-3.6, -8.2486362509))
        make_face()
        with BuildLine():
            ThreePointArc((3.6, -8.2486362509), (4.2549900398, -7.6954473787), (4.5, -6.8738635424))
            Line((4.5, -6.8738635424), (4.5, -7.7942286341))
            ThreePointArc((4.5, -7.7942286341), (4.056368027, -8.0340449606), (3.6, -8.2486362509))
        make_face()
    extrude(amount=F14_T3_DEPTH, mode=Mode.SUBTRACT)


solid = Compound([f1.part, f9.part])
